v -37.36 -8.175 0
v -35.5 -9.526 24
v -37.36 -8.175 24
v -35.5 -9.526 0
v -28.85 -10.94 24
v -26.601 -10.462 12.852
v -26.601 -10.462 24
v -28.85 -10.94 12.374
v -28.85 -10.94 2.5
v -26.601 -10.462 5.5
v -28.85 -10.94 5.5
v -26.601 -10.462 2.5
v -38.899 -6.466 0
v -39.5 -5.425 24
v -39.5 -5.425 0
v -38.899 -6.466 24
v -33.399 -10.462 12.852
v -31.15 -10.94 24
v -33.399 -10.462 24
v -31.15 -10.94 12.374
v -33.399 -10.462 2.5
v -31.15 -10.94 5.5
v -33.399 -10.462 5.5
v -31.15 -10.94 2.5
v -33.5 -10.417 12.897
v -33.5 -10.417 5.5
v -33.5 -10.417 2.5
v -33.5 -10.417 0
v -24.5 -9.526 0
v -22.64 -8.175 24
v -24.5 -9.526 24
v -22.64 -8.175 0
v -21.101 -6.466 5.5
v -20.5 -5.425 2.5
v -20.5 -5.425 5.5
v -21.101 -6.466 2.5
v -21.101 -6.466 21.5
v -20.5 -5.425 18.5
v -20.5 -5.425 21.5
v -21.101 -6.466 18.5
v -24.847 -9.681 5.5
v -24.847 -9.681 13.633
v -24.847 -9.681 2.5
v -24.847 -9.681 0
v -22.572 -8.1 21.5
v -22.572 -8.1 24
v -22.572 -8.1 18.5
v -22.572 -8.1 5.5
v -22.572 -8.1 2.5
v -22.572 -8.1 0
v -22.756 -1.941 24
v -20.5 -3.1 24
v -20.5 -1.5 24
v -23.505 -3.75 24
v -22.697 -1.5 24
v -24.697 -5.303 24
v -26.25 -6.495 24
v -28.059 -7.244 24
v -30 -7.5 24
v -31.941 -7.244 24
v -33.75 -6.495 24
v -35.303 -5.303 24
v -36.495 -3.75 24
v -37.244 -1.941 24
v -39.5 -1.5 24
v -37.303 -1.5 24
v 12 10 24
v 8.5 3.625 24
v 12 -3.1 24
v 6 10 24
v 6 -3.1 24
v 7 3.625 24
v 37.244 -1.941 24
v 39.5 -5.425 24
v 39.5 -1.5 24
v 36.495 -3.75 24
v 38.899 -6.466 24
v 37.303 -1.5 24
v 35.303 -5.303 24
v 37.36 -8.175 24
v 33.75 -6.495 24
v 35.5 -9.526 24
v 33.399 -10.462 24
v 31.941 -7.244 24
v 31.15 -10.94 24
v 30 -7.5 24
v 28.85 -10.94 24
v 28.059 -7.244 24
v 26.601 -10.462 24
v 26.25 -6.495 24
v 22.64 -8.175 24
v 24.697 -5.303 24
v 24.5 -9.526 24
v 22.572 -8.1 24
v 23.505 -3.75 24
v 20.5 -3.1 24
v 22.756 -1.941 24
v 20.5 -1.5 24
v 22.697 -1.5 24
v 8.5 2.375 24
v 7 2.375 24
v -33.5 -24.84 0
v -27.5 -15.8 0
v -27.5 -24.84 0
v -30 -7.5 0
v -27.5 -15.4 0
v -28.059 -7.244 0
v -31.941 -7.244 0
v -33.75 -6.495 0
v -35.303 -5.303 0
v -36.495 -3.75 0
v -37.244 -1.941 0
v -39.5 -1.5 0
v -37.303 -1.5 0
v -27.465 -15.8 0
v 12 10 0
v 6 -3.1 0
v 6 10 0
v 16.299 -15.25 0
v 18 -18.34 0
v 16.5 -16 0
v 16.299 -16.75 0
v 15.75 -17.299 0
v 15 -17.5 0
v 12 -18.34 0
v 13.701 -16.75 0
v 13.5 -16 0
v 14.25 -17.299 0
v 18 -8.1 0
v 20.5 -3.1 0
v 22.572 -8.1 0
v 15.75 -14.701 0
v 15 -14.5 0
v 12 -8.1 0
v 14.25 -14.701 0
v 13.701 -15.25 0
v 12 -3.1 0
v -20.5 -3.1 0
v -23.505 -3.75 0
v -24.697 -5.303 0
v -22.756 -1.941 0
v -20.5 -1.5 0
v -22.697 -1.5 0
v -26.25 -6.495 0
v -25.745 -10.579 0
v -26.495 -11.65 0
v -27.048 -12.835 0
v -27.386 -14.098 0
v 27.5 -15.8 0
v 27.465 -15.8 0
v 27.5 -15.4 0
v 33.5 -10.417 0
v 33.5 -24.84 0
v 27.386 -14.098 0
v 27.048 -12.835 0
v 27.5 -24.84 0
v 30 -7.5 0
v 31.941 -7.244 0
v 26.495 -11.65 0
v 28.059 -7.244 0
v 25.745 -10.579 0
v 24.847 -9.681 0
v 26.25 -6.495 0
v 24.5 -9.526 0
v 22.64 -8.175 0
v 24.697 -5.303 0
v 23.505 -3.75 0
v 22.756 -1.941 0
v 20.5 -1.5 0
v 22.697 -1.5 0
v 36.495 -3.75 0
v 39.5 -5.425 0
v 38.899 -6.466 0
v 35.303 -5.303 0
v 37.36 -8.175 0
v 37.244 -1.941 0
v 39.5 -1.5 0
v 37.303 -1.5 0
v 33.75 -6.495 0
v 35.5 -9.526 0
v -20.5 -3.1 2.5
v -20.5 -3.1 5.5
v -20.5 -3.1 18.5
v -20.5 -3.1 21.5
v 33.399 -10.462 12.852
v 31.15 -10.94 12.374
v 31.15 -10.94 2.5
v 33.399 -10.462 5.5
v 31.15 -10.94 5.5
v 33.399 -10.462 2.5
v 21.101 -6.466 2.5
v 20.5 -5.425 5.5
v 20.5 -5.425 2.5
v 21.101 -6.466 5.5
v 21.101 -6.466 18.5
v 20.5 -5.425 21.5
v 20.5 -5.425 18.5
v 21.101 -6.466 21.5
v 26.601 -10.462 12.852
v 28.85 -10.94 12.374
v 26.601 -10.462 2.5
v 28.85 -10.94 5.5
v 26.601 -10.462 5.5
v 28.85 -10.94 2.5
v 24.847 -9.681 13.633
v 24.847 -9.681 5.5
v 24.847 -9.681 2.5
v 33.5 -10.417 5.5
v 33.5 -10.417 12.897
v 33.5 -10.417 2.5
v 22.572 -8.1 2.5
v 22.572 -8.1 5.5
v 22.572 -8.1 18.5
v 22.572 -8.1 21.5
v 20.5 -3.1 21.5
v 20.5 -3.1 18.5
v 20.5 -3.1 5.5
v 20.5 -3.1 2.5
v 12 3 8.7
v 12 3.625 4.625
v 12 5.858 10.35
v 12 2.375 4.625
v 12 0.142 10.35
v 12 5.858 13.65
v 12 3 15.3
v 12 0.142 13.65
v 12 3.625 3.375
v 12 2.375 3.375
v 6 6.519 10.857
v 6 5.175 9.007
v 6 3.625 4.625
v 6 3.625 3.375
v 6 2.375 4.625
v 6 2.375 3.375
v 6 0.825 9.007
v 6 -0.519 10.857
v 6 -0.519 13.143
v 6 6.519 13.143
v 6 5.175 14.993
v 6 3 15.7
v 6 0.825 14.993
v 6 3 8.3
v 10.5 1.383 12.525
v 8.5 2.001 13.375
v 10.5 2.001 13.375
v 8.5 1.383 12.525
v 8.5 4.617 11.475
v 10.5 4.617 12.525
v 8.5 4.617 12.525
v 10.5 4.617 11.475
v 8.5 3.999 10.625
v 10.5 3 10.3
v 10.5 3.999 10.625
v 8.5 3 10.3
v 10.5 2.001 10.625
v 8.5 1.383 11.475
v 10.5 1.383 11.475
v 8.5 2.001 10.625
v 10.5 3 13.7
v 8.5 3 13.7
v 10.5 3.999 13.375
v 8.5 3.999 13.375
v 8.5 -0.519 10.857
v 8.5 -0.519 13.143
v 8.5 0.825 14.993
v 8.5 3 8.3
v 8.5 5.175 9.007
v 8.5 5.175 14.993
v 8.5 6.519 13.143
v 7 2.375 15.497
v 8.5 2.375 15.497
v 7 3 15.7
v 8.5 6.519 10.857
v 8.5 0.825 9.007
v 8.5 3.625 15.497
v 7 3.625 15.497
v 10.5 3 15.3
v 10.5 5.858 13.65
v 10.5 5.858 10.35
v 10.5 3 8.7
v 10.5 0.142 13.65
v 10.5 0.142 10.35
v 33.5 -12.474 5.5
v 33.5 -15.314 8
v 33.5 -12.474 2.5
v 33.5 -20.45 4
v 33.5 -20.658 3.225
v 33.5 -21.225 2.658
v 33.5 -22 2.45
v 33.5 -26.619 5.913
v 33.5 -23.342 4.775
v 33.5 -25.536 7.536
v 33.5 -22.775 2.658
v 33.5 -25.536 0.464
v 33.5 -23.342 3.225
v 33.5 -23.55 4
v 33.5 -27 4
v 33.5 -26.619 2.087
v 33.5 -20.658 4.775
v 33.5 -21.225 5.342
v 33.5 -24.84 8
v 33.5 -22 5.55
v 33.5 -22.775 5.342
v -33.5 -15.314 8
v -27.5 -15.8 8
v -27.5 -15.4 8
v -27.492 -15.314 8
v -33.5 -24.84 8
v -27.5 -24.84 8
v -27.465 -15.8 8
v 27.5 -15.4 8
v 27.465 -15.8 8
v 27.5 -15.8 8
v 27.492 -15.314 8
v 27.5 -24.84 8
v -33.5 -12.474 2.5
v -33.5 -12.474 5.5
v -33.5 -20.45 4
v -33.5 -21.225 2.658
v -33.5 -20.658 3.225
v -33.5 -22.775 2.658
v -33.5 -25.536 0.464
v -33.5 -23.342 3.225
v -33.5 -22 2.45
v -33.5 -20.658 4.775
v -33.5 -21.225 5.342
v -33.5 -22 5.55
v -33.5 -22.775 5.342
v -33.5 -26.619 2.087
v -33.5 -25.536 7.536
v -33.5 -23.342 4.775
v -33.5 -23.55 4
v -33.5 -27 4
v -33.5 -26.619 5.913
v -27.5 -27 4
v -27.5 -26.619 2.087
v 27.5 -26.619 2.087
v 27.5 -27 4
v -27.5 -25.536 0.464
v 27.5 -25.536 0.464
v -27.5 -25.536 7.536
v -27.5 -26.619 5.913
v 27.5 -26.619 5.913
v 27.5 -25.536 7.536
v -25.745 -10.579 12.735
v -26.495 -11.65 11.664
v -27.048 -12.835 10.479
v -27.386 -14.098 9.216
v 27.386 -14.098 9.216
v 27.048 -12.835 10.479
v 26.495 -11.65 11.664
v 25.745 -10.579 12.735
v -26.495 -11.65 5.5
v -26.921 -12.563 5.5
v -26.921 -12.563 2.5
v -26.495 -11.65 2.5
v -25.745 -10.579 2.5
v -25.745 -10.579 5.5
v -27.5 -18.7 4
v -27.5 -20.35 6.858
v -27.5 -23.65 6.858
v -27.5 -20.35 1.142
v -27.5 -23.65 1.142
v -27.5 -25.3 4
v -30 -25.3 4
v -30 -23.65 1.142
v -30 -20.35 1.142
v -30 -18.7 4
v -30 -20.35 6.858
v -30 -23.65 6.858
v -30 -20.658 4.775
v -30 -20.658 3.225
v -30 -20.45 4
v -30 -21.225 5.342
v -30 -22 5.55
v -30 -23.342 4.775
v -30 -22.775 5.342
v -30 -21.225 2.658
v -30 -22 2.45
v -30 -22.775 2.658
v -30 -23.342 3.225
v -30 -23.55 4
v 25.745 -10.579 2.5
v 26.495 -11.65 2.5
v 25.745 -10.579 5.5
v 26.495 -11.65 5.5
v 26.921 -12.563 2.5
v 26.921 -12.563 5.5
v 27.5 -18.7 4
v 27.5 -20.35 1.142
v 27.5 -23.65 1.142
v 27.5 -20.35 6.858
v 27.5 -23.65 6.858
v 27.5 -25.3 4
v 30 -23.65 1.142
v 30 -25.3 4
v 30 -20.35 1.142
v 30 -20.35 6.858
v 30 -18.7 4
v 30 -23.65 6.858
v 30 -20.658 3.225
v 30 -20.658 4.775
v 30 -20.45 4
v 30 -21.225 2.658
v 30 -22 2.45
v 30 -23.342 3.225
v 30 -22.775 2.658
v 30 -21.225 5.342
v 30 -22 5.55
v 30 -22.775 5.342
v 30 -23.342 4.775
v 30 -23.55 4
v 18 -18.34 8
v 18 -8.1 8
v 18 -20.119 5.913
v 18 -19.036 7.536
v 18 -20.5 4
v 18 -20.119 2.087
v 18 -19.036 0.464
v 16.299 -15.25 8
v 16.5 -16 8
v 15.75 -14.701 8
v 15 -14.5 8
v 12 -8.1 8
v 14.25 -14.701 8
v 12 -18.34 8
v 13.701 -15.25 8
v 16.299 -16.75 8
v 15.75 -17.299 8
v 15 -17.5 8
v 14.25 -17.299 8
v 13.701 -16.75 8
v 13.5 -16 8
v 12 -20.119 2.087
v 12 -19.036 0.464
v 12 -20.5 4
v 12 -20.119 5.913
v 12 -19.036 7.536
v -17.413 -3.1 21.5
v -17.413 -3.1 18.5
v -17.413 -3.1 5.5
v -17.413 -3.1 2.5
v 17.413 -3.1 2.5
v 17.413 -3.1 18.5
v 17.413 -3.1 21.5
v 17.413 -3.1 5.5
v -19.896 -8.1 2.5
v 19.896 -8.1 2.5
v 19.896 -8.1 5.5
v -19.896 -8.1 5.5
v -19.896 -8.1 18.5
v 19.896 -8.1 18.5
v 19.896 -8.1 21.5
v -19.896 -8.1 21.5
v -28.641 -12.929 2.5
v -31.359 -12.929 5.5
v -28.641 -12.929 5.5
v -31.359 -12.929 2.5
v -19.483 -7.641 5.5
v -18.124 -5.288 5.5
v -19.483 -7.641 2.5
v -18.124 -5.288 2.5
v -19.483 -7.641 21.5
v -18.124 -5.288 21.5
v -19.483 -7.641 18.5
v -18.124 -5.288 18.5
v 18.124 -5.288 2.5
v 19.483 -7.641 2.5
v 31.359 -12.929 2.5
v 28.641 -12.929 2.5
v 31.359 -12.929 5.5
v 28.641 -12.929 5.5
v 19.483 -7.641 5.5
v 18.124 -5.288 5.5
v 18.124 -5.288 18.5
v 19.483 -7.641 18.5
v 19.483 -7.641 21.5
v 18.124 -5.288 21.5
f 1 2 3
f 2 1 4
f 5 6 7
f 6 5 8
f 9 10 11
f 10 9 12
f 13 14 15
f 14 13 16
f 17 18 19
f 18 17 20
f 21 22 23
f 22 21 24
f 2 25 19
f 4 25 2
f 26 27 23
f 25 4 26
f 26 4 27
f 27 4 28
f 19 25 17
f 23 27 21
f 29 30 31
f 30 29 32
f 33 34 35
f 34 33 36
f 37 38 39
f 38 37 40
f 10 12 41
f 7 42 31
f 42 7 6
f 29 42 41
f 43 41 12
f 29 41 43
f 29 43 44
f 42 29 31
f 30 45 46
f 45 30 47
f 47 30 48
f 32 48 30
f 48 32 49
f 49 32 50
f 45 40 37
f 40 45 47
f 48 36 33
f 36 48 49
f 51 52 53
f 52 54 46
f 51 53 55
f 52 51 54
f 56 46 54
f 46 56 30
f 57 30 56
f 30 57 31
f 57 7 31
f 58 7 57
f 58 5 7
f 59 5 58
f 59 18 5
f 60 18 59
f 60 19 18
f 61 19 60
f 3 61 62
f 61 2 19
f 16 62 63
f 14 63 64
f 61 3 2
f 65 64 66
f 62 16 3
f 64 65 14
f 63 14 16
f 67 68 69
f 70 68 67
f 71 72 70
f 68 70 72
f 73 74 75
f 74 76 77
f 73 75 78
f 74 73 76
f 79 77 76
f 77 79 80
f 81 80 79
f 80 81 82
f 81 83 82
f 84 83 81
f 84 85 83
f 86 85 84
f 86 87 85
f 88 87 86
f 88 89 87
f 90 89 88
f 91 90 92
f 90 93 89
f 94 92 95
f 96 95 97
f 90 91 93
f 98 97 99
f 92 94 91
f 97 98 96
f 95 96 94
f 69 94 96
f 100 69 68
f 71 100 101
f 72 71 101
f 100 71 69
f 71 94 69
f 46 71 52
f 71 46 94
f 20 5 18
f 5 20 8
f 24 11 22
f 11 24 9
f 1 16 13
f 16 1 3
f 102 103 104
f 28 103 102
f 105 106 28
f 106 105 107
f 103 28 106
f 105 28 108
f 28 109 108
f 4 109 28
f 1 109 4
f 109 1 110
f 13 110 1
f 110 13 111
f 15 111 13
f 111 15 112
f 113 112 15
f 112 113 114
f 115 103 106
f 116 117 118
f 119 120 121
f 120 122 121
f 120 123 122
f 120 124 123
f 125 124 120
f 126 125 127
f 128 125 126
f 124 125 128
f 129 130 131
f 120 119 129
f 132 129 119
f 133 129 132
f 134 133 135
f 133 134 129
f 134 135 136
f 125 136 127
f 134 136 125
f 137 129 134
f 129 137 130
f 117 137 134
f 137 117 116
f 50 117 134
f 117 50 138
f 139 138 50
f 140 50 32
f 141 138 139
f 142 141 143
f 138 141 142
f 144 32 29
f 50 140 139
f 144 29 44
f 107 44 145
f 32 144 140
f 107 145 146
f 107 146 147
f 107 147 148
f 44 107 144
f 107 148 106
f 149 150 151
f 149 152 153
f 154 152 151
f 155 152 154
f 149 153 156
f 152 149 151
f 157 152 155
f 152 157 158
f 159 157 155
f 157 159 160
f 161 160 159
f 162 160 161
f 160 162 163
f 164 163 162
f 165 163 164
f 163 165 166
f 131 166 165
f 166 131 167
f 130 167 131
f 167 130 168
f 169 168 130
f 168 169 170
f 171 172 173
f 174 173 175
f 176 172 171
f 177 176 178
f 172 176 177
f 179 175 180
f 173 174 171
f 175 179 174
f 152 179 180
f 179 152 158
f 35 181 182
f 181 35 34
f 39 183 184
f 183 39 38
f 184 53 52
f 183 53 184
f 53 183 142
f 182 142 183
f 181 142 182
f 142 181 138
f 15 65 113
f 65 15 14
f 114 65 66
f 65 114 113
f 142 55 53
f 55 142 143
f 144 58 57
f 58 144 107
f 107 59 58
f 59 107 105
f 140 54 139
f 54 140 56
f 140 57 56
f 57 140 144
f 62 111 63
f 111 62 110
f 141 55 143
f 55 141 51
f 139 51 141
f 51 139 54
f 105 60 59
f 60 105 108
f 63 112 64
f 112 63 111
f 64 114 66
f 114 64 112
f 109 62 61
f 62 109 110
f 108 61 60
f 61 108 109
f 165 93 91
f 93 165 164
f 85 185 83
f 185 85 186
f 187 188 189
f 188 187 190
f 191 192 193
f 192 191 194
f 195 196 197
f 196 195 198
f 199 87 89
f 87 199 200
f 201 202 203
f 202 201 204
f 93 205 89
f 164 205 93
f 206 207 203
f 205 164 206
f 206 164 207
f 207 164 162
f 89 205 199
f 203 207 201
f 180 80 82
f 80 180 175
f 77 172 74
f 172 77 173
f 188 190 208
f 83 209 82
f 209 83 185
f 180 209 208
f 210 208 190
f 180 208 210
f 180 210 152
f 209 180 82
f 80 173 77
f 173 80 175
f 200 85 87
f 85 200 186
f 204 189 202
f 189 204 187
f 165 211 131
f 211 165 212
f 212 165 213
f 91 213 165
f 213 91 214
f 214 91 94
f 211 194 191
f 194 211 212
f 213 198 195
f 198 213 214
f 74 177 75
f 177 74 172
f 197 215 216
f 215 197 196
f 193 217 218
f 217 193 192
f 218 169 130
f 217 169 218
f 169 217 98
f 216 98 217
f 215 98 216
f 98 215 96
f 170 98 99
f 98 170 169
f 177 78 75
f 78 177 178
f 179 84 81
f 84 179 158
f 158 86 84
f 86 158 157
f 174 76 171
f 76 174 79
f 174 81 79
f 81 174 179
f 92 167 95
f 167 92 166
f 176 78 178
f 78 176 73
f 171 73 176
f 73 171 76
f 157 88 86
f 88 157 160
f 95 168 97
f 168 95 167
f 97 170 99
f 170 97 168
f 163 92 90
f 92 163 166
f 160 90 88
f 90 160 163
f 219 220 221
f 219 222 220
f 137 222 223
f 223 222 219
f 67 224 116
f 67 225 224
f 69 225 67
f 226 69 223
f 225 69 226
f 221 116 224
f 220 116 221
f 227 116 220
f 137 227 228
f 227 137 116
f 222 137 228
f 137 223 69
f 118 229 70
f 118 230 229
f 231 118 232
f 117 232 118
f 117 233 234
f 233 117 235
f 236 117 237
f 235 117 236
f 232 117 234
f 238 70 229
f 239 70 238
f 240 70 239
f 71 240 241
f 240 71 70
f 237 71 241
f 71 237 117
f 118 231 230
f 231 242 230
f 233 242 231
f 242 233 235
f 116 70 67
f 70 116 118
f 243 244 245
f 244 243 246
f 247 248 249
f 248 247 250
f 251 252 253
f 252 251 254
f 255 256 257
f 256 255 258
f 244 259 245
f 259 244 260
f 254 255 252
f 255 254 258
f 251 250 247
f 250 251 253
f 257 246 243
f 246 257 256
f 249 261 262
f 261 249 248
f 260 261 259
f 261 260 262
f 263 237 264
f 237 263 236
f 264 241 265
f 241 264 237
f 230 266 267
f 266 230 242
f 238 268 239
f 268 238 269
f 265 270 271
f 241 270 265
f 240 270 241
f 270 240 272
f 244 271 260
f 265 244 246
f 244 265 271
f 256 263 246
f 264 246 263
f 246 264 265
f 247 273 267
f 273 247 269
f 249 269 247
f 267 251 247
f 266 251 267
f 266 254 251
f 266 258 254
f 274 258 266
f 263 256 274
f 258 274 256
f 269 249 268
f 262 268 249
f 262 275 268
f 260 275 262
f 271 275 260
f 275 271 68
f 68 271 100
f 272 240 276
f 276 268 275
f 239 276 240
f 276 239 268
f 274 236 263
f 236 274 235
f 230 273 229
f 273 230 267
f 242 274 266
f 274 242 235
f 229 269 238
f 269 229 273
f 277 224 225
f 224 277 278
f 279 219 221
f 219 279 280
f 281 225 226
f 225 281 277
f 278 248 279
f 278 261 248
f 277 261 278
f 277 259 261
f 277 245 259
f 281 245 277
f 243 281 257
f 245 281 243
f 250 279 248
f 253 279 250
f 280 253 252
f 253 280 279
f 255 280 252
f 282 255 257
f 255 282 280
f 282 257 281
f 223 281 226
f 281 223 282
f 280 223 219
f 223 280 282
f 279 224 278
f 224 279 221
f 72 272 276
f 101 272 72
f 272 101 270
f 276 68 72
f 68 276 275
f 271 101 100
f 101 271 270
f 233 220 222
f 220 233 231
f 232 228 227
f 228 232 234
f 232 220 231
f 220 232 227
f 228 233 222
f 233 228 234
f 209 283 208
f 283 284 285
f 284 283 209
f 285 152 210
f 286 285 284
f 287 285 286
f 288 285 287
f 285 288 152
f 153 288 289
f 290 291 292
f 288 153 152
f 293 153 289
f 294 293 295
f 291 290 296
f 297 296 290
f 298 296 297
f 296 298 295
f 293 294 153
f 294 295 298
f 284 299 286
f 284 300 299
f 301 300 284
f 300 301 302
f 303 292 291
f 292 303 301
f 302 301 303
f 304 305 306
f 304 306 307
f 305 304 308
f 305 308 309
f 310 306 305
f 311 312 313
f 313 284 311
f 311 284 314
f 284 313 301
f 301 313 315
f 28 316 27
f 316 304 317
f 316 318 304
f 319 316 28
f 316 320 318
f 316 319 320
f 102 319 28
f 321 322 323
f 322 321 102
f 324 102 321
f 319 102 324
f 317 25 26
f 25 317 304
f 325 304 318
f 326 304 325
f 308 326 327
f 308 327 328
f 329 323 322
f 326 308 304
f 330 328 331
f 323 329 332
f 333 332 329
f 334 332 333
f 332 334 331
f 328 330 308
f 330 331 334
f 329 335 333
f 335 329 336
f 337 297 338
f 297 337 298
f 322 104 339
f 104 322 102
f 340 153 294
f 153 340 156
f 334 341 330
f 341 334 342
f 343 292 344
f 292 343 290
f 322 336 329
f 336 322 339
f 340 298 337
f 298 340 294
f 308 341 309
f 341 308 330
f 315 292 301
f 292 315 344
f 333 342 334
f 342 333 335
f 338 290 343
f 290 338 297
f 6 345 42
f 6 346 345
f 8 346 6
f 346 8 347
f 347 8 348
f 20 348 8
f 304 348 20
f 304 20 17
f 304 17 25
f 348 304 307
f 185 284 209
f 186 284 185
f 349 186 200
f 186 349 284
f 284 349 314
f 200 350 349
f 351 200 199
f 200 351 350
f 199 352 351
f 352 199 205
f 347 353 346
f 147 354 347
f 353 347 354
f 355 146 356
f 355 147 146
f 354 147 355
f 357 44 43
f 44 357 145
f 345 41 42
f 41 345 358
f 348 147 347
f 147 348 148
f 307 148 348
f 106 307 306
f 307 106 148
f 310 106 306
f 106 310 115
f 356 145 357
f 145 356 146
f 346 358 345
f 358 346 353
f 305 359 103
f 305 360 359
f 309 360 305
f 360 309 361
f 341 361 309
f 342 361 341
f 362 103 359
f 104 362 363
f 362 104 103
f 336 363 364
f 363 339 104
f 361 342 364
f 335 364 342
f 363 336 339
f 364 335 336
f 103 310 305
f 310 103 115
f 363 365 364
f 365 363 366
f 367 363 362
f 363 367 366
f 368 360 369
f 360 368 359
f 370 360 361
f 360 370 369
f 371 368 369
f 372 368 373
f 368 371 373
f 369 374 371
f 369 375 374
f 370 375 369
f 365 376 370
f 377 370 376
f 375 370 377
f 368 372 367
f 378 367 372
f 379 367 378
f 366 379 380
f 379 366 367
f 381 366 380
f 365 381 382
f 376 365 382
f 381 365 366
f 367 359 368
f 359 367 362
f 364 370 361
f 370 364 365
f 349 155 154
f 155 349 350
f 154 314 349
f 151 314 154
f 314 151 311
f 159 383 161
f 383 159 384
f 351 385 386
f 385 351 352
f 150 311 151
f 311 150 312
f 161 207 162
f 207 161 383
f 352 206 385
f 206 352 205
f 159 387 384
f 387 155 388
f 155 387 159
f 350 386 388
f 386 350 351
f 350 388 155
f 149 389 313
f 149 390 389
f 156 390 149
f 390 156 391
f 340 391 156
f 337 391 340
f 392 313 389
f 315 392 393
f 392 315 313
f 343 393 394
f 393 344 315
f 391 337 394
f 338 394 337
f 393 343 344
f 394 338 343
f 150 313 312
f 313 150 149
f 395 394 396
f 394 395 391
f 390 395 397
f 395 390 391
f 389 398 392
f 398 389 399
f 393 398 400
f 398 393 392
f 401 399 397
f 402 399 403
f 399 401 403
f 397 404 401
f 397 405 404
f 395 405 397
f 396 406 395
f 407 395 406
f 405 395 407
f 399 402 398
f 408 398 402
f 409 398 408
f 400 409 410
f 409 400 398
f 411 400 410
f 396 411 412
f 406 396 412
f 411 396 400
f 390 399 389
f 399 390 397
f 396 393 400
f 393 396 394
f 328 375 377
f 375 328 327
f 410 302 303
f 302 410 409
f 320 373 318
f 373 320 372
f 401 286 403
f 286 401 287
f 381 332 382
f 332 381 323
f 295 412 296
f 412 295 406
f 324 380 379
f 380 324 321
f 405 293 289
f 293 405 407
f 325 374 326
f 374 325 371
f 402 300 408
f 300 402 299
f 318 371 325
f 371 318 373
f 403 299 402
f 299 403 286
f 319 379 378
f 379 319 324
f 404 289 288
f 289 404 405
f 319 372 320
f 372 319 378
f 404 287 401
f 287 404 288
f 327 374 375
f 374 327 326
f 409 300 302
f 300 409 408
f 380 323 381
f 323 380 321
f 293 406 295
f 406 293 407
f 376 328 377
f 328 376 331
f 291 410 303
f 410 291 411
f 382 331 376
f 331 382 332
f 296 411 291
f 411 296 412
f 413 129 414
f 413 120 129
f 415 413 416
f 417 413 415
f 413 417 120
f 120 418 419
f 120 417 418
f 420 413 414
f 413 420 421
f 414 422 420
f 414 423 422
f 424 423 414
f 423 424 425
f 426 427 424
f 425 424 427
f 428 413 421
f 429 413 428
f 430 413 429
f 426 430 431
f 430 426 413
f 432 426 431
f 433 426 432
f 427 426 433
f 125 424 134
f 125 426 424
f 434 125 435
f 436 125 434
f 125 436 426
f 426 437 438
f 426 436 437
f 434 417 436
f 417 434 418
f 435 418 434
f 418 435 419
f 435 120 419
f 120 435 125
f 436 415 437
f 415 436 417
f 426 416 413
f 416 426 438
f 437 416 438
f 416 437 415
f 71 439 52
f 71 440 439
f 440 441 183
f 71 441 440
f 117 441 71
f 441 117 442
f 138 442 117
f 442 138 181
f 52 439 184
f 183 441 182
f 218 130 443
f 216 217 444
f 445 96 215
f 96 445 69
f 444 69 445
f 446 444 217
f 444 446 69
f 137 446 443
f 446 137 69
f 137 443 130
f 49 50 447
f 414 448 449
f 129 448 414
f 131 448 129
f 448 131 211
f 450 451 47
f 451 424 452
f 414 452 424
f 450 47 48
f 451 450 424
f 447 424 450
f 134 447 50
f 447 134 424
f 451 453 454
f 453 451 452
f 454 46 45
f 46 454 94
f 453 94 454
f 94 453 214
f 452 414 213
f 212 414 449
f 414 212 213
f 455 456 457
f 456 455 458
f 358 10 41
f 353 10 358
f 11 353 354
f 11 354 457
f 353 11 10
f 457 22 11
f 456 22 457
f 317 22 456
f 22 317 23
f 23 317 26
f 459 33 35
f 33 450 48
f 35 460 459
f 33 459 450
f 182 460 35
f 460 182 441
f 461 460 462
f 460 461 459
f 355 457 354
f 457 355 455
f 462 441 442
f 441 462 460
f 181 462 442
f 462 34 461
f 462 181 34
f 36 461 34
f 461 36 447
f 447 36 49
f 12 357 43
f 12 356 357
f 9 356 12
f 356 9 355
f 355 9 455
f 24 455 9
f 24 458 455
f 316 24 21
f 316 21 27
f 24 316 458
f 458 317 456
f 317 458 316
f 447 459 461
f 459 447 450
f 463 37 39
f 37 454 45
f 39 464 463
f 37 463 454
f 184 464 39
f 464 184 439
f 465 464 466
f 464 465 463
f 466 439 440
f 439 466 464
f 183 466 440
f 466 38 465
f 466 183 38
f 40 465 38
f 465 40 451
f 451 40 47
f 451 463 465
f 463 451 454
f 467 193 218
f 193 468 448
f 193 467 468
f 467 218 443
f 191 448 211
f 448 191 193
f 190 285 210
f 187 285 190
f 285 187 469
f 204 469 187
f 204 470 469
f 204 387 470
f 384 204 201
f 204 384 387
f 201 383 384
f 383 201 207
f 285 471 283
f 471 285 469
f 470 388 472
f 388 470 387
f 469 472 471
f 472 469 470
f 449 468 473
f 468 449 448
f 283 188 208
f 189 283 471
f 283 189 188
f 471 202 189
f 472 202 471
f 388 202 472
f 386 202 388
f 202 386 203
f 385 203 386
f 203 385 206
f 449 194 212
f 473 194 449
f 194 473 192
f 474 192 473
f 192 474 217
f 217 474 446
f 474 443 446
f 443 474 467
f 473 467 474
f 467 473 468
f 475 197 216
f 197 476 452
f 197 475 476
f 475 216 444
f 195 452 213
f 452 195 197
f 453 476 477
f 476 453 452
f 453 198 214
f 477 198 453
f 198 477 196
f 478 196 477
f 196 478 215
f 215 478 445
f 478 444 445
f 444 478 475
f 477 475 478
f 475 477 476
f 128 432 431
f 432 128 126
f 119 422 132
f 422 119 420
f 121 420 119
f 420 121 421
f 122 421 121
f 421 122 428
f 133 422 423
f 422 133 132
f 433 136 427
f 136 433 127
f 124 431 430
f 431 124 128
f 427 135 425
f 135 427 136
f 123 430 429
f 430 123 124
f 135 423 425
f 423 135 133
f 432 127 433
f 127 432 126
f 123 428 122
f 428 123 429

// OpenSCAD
// file: configuration.scad
motor_end_height=44;
idler_end_height=28;
carriage_height=24;
platform_thickness=8;
bed_thickness=12;
pcb_thickness=2;
rod_length=120;
smooth_rod_length=300;
tower_radius = 120;
platform_hinge_offset=33;
carriage_hinge_offset=22;



//from kossel legacy
// Increase this if your slicer or printer make holes too tight.
extra_radius = 0.15;

// OD = outside diameter, corner to corner.
m3_nut_od = 6.1;
m3_nut_radius = m3_nut_od/2 + 0.2 + extra_radius;

// Major diameter of metric 3mm thread.
m3_major = 2.85;
m3_radius = m3_major/2 + extra_radius;
m3_wide_radius = m3_major/2 + 0.2 + extra_radius;

// NEMA17 stepper motors.
motor_shaft_diameter = 5;
motor_shaft_radius = motor_shaft_diameter/2 + extra_radius;

// Frame brackets.
thickness = 3.6;
// main file
include <configuration.scad>

width = 67;
height = carriage_height;

offset = 20;
cutout = 15;
middle = 2*offset - width/2;

module parallel_joints(reinforced) {
  difference() {
    union() {
      intersection() {
        cube([width, 20, 8], center=true);
        rotate([0, 90, 0]) cylinder(r=5, h=width, center=true);
      }
      intersection() {
        translate([0, 18, 4]) rotate([45, 0, 0])
          cube([width, reinforced, reinforced], center=true);
        translate([0, 0, 20]) cube([width, 35, 40], center=true);
      }
      translate([0, 8, 0]) cube([width, 16, 8], center=true);
    }
    rotate([0, 90, 0]) cylinder(r=1.55, h=80, center=true, $fn=12);

    for (x = [-offset, offset]) {
      translate([x, 6.6, 0])
        cylinder(r=cutout/2, h=100, center=true, $fn=36);
      translate([x, -3.8, 0])
        cube([cutout, 20, 100], center=true);
      translate([x, 0, 0]) rotate([0, 90, 0]) rotate([0, 0, 30])
        cylinder(r=3.3, h=20, center=true, $fn=6);
    }
    translate([0, 4, 0])
      cube([2*offset+7, 20, 100], center=true);
    //translate([0, 2, 0]) cylinder(r=middle, h=100, center=true);
    //translate([0, -8, 0]) cube([2*middle, 20, 100], center=true);
  }
}

module lm8uu_mount(d, h) {
  union() {
    difference() {
      intersection() {
        cylinder(r=11, h=h, center=true);
        translate([0, -8, 0]) cube([19, 13, h+1], center=true);
      }
      cylinder(r=d/2, h=h+1, center=true);
    }
  }
}

module Spectra_Line_Mount() {
  difference() {
    union() {
      difference() {
       	translate([9, 3, 0]) cube([6, 14, height], center=true); //The main support

        translate([8,3,0]) rotate([0,90,0]) cylinder(r=1.7, h=10,center=true, $fn = 10); //3mm screw hole
	translate([3.5,3,0]) rotate([0,90,0]) cylinder(r=3.7,h=10,center=true, $fn = 10);  //3mm washer tensioner space
	translate([11.5,3,0]) rotate([0,90,0]) cylinder(r=3.3,h=2,center=true, $fn=6);

	translate([7.75,3,8]) cube([1.5,1.25,15],center=true); //Spectra line hole space
	translate([9,3,-8]) cube([7,1.25,1.25],center=true);
      }
    }
  }
}

module carriage() {
  translate([0, 0, height/2]) 
  union() {
    for (x = [-30, 30]) {
      translate([x, 0, 0]) lm8uu_mount(d=15, h=24);
    }
    Spectra_Line_Mount();
    difference() {
      union() {
        translate([0, -5.6, 0])
          cube([50, 5, height], center=true);
        translate([0, -carriage_hinge_offset, -height/2+4])
          parallel_joints(16);
        // endstop column
        translate([15, -10, -height/2+4])
          cube([6, 10, 8], center=true);
        translate([15, -15.5, -height/2+4])
          intersection() {
            cube([6, 20, 8], center=true);
            rotate([0, 90, 0]) cylinder(r=5, h=6, center=true);
          }
      }
      // Screw hole for adjustable top endstop.
      translate([15, -16, -height/2+4])
        cylinder(r=1.5, h=20, center=true, $fn=12);
      for (x = [-30, 30]) {
        translate([x, 0, 0])
          cylinder(r=8, h=height+1, center=true);
        // Zip tie tunnels.
        for (z = [-height/2+4, height/2-4])
          translate([x, 0, z])
            cylinder(r=13, h=3, center=true);
      }
    }
  }
}

carriage();
//parallel_joints(0);

// Uncomment the following lines to check endstop alignment.
// use <idler_end.scad>;
// translate([0, 0, -20]) rotate([180, 0, 0]) idler_end();
